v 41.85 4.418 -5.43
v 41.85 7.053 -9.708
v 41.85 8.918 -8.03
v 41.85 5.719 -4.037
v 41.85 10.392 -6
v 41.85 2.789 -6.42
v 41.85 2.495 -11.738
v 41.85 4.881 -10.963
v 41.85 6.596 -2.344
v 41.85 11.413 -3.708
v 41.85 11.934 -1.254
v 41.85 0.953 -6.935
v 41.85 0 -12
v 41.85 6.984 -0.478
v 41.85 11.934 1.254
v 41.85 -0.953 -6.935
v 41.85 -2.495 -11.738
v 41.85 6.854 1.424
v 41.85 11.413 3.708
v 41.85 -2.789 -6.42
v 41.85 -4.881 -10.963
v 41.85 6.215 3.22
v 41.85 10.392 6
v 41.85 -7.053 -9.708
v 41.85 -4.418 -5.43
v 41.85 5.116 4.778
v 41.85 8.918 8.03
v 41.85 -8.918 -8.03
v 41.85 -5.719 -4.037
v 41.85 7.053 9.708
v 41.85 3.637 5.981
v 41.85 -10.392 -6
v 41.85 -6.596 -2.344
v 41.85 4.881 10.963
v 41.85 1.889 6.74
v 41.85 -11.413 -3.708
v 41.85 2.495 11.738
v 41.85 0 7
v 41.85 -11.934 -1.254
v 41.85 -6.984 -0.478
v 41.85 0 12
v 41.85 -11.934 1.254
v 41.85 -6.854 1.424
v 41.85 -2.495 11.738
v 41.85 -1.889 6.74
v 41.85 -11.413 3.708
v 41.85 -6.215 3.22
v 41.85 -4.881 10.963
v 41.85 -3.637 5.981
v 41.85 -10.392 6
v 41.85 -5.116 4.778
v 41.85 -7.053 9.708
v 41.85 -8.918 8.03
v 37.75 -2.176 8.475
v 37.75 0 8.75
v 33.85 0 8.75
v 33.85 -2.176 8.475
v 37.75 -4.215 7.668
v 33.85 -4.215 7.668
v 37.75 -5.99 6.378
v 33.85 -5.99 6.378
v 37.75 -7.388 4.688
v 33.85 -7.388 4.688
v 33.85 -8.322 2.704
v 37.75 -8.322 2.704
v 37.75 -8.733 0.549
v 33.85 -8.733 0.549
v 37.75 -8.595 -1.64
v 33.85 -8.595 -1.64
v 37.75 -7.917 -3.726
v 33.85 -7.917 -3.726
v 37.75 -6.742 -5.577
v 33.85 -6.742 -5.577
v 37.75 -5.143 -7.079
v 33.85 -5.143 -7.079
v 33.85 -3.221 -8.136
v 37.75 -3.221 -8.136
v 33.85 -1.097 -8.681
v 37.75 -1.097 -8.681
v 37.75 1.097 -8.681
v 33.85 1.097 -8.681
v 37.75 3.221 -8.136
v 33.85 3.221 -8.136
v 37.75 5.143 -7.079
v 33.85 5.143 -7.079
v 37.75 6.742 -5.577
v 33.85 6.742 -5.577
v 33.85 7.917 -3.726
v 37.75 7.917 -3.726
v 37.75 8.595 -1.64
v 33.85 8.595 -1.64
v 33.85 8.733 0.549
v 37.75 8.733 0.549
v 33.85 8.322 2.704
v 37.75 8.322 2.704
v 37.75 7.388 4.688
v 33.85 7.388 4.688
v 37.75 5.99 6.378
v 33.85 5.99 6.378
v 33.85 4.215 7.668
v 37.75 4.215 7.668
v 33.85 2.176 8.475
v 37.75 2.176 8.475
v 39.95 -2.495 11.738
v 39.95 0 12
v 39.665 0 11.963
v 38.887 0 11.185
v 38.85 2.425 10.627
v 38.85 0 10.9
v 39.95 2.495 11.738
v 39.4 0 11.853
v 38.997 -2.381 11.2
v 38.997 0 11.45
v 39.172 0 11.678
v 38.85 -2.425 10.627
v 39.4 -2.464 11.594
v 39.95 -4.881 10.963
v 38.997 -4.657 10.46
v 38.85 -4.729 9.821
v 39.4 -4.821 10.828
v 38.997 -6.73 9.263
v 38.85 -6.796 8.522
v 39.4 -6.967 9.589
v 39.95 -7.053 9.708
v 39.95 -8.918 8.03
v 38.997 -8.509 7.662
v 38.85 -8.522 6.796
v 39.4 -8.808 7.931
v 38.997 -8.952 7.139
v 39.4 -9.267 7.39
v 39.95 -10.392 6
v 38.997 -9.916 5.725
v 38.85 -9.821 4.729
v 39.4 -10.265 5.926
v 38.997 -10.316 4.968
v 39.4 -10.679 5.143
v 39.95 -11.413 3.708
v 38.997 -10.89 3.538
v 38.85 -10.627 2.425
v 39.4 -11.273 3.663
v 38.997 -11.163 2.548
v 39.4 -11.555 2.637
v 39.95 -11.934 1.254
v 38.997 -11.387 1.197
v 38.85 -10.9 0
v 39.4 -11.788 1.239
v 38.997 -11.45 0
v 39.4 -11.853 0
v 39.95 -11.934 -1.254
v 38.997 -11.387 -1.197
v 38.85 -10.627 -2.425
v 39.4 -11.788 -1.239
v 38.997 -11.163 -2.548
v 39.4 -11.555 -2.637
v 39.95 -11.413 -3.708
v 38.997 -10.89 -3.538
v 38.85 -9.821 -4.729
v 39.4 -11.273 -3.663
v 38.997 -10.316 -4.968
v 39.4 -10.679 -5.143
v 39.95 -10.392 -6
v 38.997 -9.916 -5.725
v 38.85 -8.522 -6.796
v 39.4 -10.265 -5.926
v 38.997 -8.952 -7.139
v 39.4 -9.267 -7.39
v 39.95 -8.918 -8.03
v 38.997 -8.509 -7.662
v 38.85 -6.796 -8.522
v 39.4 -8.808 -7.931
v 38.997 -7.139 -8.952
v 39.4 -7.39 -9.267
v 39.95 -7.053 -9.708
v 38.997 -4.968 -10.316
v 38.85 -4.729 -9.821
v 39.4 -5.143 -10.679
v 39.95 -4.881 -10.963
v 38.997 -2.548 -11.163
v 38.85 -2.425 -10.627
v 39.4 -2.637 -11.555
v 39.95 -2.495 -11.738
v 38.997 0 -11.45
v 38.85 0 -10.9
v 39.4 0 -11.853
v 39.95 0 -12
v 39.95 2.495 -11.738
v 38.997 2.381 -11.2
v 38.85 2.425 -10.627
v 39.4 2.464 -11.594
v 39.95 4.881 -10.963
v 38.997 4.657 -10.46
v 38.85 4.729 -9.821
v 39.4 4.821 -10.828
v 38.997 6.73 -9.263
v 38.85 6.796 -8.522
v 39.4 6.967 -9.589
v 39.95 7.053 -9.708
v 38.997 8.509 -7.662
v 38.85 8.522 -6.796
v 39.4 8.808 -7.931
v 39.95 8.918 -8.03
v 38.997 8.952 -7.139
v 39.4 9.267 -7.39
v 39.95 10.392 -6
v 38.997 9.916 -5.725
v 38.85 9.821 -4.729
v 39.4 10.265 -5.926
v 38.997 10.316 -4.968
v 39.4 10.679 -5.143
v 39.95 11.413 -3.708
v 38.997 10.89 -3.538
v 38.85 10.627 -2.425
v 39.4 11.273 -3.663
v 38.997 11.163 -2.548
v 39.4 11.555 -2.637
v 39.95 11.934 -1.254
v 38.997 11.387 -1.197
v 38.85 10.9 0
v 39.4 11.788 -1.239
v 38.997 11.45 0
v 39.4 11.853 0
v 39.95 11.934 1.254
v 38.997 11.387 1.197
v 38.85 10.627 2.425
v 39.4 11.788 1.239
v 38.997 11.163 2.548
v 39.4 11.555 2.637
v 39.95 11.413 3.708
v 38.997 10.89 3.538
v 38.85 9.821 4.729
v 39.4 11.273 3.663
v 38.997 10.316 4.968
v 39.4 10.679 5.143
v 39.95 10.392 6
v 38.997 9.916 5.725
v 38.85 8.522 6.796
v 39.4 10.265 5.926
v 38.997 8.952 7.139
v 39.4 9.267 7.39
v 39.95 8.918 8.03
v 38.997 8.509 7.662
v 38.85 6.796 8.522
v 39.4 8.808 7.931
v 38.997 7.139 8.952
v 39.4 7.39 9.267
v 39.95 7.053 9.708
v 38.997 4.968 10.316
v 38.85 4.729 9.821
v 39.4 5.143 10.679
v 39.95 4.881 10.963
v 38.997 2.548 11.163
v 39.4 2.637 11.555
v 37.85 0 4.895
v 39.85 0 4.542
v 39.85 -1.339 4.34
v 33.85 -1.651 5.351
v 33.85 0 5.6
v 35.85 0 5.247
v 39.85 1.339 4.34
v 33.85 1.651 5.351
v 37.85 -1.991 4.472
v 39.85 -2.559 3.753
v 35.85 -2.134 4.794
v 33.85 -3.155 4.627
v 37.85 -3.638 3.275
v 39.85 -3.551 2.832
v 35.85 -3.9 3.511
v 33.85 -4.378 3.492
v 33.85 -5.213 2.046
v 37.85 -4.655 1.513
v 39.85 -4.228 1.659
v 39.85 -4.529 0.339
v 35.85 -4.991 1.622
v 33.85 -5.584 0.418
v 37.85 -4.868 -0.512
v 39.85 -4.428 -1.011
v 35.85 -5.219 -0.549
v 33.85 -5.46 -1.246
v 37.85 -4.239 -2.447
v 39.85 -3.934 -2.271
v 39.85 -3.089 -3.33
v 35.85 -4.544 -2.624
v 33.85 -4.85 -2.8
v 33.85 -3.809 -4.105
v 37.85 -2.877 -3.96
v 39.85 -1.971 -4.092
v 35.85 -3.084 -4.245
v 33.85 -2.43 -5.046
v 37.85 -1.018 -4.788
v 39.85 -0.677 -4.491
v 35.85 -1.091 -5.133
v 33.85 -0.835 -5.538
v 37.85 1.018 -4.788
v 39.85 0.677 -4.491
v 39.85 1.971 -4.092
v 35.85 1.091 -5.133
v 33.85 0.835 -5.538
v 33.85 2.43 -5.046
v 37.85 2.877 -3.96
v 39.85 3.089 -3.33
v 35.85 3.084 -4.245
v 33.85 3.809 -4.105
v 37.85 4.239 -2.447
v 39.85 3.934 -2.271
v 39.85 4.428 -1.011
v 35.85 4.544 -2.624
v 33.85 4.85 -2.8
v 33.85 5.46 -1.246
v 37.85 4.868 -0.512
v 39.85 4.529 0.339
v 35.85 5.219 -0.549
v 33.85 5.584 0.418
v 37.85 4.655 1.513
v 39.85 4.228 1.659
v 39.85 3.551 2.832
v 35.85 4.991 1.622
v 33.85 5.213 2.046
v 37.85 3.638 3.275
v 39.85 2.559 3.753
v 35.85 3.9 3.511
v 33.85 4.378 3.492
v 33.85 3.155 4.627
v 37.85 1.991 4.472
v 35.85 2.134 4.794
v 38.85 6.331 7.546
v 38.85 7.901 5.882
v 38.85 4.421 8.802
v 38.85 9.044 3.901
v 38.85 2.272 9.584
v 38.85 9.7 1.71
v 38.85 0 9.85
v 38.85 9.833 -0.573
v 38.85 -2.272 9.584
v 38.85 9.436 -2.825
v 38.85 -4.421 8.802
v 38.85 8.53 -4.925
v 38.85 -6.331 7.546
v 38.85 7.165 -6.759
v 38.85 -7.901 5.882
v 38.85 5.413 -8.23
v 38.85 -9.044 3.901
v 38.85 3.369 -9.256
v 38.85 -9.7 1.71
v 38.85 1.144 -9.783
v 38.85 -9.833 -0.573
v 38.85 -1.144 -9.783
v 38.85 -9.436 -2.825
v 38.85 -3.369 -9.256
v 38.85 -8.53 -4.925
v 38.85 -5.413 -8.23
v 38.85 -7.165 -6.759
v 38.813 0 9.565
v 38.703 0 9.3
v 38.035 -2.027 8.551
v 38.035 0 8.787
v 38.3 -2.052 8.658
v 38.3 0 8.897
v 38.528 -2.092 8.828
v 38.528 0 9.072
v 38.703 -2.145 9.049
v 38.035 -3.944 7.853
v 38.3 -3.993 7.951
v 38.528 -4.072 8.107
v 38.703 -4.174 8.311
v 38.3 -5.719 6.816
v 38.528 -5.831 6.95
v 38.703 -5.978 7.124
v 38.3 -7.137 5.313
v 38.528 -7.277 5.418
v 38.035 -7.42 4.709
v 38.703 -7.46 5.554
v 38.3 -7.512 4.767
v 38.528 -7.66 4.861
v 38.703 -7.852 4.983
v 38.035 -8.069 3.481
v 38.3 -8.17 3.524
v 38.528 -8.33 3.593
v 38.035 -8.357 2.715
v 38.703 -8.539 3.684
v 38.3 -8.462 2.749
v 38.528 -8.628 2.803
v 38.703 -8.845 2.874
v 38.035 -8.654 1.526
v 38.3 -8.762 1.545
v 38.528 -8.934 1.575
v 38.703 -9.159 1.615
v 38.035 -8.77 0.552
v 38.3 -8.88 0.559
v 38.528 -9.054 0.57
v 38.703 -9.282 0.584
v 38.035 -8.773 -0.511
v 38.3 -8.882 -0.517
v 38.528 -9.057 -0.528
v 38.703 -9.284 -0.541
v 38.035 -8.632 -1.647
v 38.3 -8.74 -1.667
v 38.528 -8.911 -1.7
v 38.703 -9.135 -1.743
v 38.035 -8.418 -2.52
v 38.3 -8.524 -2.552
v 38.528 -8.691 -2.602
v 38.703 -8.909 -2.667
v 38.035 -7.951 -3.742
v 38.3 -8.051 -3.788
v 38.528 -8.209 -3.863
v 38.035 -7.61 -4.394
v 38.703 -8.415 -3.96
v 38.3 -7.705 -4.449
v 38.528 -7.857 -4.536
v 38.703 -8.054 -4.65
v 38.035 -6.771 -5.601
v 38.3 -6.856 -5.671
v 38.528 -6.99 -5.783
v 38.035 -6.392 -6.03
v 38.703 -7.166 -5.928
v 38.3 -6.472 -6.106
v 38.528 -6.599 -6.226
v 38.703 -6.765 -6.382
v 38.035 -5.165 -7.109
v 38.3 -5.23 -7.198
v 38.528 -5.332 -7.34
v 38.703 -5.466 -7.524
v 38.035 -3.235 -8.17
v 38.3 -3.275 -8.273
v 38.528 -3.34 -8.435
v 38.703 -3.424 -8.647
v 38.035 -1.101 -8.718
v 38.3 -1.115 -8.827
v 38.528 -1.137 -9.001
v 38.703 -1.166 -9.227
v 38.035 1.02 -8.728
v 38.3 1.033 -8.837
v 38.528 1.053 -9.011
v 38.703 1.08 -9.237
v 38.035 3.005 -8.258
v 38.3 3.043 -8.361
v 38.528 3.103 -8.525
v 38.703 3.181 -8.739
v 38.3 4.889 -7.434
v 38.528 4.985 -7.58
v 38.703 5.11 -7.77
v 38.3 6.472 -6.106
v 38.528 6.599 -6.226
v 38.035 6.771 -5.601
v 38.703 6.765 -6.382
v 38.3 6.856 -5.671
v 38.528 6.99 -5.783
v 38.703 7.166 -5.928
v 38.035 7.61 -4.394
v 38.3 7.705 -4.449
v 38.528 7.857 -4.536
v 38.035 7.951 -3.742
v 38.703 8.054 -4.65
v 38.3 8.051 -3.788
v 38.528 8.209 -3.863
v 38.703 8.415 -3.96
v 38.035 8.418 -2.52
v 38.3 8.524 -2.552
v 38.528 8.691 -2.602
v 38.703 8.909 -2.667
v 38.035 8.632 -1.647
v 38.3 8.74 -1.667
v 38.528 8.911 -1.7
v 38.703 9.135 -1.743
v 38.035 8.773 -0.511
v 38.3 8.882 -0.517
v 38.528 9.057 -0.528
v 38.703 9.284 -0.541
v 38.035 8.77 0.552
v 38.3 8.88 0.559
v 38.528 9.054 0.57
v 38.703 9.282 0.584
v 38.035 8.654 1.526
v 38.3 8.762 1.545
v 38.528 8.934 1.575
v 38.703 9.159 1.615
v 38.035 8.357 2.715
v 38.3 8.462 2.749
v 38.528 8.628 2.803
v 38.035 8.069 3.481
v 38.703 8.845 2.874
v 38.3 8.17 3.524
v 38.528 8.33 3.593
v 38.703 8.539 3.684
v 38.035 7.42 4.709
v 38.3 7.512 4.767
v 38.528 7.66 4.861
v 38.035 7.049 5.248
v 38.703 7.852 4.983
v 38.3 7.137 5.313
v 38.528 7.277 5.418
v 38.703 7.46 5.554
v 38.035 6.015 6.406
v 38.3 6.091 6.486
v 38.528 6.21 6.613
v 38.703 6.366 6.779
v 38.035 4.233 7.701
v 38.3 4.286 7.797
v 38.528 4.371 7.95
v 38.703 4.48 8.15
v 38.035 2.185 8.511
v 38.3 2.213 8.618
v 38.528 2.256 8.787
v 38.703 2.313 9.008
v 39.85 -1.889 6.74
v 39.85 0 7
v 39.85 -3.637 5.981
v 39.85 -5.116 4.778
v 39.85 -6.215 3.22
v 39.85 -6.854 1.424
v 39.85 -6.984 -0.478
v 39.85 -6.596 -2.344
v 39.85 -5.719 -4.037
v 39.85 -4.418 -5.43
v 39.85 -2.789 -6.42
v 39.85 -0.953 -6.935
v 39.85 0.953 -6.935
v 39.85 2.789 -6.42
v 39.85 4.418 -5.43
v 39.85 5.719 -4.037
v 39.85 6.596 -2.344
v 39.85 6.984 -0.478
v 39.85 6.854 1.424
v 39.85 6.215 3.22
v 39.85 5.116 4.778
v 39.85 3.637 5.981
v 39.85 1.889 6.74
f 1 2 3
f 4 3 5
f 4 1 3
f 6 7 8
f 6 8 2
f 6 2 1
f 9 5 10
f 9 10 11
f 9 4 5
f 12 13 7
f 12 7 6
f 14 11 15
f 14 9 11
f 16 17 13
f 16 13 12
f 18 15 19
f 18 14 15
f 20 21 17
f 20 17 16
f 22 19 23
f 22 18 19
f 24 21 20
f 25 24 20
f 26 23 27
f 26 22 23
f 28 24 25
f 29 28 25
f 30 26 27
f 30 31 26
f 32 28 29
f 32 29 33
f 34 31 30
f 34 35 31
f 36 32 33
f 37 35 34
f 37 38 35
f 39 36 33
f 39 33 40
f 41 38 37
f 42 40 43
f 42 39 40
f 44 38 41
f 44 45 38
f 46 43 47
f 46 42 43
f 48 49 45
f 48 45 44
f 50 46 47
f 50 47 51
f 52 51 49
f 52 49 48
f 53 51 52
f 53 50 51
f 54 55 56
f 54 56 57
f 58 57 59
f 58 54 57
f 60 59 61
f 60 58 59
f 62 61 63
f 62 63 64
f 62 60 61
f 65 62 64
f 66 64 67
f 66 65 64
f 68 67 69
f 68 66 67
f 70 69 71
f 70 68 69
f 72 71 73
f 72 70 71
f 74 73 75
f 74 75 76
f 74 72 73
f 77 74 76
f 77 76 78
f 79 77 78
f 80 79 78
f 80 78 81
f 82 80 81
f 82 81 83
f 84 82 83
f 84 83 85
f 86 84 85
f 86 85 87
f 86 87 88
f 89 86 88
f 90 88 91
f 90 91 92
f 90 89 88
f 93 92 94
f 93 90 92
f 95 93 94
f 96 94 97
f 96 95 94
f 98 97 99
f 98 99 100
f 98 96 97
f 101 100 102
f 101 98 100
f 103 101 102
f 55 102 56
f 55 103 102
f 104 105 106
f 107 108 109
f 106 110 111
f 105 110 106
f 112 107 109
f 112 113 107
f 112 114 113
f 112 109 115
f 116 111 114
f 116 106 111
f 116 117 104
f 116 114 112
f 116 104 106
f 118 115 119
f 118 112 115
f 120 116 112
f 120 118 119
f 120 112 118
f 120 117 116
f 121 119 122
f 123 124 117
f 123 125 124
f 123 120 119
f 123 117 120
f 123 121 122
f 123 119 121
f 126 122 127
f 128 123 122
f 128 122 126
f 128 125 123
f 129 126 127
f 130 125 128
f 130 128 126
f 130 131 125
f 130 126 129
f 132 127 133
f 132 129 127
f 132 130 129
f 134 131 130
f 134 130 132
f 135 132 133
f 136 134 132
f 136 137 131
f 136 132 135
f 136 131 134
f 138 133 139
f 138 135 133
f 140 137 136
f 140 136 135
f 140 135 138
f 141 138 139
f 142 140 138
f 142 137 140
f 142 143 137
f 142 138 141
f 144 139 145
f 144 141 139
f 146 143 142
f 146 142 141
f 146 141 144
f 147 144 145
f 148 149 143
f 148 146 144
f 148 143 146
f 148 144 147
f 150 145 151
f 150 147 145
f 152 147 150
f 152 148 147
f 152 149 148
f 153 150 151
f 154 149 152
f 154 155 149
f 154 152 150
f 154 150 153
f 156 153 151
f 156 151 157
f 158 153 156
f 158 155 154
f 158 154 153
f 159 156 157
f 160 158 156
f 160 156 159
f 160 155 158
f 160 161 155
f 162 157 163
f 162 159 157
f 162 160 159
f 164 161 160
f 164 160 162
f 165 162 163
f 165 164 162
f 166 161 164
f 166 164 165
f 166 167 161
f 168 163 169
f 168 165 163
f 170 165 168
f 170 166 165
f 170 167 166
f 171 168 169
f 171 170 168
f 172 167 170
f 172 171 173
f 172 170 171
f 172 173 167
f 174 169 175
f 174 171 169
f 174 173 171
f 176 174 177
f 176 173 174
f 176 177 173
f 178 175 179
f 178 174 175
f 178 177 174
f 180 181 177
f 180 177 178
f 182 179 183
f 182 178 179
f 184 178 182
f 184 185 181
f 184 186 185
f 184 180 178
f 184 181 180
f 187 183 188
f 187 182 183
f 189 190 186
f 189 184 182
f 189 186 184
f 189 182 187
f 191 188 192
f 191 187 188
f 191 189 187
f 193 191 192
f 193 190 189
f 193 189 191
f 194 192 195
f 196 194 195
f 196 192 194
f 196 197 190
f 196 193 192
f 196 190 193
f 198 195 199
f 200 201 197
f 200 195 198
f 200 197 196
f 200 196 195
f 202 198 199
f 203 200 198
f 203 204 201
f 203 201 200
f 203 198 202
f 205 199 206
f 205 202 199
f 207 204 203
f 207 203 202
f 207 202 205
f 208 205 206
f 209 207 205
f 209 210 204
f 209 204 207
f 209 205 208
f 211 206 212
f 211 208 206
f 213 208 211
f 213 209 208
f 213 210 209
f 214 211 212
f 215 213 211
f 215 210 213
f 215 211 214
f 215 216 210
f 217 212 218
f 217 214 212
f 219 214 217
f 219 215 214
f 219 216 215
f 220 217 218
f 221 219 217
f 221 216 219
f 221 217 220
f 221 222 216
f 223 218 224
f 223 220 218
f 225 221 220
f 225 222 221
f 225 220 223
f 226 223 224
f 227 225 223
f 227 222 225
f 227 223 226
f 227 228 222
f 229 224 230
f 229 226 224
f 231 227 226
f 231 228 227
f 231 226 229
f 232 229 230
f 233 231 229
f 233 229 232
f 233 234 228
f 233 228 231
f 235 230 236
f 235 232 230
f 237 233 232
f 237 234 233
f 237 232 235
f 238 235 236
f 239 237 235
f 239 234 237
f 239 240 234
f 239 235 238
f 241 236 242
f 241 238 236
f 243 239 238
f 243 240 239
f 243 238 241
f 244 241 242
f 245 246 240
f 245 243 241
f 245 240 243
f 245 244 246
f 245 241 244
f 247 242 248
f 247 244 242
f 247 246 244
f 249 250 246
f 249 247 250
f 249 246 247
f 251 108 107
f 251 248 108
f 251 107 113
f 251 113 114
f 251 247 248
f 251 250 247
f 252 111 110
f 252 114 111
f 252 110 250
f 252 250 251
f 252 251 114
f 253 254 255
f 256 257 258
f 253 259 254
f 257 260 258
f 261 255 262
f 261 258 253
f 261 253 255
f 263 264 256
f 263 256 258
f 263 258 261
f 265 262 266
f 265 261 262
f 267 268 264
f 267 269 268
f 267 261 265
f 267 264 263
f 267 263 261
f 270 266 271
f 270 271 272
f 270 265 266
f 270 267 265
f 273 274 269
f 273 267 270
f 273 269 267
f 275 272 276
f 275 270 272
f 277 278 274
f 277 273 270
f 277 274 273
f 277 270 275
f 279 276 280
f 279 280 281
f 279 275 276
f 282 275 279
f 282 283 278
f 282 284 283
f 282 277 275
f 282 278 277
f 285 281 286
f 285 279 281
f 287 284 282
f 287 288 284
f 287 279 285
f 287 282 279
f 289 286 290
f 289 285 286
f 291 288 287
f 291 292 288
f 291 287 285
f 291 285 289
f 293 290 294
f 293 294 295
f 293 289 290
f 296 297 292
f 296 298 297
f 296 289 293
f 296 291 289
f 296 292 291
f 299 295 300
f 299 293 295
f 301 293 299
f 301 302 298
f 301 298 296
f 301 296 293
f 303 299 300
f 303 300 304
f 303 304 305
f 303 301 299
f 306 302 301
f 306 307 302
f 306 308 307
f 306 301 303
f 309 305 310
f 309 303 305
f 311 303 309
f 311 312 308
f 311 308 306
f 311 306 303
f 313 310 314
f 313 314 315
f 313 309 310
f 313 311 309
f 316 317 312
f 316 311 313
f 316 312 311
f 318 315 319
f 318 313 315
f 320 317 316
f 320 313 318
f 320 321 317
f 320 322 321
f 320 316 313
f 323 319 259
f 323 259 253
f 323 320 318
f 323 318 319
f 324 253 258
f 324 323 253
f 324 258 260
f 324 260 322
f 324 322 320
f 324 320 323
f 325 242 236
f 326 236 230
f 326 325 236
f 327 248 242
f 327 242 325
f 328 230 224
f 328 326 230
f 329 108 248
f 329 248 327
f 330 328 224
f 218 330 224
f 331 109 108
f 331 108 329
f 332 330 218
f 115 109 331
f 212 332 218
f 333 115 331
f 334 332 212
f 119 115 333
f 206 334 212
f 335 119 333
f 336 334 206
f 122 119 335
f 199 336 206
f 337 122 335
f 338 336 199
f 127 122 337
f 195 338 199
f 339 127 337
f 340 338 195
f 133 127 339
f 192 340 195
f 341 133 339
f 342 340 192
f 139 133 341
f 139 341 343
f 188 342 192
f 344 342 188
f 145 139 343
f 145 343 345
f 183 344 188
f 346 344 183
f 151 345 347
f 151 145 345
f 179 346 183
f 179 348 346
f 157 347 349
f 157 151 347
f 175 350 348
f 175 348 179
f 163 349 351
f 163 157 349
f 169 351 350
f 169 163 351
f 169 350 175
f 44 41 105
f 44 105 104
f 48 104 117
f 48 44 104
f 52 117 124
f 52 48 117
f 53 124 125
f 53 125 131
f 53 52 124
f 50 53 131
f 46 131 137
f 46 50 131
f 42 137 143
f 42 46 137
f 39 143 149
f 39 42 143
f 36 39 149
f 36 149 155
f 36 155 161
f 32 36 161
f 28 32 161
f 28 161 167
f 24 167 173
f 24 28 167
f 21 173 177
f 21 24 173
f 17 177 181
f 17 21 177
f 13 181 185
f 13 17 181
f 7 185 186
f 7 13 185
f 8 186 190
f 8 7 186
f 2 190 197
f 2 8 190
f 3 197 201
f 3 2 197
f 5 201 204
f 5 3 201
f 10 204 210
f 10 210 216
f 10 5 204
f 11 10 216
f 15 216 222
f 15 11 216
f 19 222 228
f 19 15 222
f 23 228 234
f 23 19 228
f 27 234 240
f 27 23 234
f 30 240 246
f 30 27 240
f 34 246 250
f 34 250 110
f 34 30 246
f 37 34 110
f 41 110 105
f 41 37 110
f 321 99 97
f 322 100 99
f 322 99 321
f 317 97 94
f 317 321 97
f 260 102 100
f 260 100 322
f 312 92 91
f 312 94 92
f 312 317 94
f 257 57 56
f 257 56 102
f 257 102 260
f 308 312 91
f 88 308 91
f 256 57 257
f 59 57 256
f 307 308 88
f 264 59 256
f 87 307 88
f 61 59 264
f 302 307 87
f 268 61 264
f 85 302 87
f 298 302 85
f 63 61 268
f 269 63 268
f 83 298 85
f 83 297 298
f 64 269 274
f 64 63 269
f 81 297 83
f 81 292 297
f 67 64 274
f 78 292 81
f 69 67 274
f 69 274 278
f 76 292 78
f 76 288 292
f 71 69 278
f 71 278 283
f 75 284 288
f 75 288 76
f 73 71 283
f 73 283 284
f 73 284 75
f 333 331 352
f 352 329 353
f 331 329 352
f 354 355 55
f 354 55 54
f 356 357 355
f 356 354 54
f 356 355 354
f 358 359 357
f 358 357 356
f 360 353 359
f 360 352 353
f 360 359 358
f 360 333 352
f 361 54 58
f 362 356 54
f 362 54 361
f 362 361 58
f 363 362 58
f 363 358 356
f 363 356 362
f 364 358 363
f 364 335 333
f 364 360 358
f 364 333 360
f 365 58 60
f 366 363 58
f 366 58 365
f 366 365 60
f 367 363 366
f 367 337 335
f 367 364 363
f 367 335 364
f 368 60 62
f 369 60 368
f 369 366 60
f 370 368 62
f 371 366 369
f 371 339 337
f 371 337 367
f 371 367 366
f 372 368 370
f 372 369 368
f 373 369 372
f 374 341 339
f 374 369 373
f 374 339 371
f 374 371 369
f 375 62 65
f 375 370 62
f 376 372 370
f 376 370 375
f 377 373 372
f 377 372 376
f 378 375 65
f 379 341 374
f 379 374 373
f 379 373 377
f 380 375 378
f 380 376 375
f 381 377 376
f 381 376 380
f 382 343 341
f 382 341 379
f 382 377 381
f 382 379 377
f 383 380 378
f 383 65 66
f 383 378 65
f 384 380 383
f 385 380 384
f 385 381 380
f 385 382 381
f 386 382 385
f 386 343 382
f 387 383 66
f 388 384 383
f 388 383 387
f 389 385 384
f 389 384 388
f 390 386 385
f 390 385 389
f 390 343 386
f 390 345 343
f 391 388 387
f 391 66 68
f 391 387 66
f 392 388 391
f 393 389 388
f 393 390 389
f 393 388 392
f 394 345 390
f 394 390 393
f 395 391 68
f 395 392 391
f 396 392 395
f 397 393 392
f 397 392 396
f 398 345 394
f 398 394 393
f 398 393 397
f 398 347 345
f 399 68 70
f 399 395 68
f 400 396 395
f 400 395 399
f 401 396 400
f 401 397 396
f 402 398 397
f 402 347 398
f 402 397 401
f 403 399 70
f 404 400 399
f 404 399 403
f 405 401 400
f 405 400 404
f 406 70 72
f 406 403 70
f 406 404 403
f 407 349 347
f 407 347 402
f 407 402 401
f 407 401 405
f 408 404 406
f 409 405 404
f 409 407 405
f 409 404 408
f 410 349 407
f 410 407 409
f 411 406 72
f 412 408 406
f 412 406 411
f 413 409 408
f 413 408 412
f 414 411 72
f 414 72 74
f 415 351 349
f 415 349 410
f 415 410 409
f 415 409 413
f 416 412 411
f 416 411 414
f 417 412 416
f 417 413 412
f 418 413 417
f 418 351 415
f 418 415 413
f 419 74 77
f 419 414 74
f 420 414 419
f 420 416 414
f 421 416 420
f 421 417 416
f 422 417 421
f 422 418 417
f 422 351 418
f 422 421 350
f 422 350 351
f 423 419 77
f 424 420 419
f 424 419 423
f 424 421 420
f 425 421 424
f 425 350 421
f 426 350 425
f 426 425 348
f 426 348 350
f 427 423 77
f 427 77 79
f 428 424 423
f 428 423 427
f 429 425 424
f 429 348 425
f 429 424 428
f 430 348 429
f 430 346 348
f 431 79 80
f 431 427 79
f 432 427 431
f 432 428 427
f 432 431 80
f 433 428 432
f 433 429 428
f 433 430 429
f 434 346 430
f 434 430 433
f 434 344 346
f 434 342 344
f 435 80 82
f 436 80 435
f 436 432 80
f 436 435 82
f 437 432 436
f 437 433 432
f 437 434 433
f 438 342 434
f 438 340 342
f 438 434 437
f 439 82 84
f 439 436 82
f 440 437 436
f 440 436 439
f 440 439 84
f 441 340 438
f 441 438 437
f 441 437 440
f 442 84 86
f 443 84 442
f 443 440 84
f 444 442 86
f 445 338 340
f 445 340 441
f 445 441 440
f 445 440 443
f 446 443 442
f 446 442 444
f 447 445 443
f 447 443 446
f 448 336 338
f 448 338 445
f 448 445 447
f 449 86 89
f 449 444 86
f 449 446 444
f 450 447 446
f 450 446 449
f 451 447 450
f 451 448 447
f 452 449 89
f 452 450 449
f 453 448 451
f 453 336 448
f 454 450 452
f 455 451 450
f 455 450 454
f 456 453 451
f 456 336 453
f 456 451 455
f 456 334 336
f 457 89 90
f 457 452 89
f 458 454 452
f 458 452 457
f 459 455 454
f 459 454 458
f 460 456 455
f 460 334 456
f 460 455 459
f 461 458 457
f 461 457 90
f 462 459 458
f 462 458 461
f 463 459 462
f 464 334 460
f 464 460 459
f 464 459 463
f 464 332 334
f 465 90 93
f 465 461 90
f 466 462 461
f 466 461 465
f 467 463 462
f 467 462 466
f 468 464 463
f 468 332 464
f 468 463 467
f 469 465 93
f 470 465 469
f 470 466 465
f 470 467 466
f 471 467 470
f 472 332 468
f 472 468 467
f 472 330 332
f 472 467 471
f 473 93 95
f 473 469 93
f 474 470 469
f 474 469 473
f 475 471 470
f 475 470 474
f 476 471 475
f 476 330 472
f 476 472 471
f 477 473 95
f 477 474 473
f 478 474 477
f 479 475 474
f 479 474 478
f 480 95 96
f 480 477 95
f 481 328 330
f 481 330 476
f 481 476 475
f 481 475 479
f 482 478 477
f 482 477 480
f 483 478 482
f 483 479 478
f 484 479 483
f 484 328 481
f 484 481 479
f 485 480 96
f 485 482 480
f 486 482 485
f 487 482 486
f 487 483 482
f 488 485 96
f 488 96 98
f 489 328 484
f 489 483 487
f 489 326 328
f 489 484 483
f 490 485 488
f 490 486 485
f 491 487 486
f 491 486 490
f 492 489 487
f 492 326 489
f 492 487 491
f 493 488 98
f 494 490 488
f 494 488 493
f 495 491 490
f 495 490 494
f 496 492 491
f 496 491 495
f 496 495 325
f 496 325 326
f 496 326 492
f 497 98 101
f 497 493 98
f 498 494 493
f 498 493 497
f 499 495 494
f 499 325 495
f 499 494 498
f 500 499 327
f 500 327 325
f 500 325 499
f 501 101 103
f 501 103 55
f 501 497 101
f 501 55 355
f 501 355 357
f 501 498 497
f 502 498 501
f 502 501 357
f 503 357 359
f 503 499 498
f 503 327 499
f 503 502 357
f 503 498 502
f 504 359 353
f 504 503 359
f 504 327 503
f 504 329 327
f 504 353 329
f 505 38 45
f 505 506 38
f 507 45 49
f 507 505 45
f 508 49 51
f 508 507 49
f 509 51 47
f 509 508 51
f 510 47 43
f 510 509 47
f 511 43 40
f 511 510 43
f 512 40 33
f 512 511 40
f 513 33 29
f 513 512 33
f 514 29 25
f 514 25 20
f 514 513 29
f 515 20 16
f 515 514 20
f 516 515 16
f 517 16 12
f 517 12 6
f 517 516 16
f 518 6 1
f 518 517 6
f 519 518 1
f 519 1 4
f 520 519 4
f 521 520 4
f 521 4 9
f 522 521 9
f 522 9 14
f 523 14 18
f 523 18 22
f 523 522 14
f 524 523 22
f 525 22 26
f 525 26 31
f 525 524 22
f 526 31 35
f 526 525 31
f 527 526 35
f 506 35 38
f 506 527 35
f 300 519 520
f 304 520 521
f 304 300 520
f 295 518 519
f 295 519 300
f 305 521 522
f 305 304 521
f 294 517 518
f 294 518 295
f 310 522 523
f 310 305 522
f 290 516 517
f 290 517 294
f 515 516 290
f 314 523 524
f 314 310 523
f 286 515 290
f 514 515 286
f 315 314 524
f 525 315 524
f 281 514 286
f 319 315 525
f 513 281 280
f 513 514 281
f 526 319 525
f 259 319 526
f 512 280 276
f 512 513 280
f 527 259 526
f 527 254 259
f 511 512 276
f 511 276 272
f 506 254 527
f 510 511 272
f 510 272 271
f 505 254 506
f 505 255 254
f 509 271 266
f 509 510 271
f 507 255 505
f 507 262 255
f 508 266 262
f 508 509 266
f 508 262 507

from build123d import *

# Parameters (mm, degrees)
CONG_1_R = 1.1


with BuildPart() as part:
    # Esquisse2 → Base-Révolution (revolve)
    with BuildSketch(Plane.XY, mode=Mode.PRIVATE) as base_r_volution_sk:
        Polygon((39.85, 4.542160182), (33.85, 5.600122066), (33.85, 8.75), (38.85, 8.75), (38.85, 12), (41.85, 12), (41.85, 7), (39.85, 7), align=None)
    revolve(base_r_volution_sk.sketch.rotate(Axis((0, 0, 0), (1, 0, 0)), 90), axis=Axis((0, 0, 0), (1, 0, 0)))

    # Congé1
    cong_1_edges = [part.edges().sort_by_distance(p)[0] for p in [
        (38.85, 0, -8.75),
        (38.85, 0, -12),
    ]]
    fillet(cong_1_edges, radius=CONG_1_R)


solid = part.part
